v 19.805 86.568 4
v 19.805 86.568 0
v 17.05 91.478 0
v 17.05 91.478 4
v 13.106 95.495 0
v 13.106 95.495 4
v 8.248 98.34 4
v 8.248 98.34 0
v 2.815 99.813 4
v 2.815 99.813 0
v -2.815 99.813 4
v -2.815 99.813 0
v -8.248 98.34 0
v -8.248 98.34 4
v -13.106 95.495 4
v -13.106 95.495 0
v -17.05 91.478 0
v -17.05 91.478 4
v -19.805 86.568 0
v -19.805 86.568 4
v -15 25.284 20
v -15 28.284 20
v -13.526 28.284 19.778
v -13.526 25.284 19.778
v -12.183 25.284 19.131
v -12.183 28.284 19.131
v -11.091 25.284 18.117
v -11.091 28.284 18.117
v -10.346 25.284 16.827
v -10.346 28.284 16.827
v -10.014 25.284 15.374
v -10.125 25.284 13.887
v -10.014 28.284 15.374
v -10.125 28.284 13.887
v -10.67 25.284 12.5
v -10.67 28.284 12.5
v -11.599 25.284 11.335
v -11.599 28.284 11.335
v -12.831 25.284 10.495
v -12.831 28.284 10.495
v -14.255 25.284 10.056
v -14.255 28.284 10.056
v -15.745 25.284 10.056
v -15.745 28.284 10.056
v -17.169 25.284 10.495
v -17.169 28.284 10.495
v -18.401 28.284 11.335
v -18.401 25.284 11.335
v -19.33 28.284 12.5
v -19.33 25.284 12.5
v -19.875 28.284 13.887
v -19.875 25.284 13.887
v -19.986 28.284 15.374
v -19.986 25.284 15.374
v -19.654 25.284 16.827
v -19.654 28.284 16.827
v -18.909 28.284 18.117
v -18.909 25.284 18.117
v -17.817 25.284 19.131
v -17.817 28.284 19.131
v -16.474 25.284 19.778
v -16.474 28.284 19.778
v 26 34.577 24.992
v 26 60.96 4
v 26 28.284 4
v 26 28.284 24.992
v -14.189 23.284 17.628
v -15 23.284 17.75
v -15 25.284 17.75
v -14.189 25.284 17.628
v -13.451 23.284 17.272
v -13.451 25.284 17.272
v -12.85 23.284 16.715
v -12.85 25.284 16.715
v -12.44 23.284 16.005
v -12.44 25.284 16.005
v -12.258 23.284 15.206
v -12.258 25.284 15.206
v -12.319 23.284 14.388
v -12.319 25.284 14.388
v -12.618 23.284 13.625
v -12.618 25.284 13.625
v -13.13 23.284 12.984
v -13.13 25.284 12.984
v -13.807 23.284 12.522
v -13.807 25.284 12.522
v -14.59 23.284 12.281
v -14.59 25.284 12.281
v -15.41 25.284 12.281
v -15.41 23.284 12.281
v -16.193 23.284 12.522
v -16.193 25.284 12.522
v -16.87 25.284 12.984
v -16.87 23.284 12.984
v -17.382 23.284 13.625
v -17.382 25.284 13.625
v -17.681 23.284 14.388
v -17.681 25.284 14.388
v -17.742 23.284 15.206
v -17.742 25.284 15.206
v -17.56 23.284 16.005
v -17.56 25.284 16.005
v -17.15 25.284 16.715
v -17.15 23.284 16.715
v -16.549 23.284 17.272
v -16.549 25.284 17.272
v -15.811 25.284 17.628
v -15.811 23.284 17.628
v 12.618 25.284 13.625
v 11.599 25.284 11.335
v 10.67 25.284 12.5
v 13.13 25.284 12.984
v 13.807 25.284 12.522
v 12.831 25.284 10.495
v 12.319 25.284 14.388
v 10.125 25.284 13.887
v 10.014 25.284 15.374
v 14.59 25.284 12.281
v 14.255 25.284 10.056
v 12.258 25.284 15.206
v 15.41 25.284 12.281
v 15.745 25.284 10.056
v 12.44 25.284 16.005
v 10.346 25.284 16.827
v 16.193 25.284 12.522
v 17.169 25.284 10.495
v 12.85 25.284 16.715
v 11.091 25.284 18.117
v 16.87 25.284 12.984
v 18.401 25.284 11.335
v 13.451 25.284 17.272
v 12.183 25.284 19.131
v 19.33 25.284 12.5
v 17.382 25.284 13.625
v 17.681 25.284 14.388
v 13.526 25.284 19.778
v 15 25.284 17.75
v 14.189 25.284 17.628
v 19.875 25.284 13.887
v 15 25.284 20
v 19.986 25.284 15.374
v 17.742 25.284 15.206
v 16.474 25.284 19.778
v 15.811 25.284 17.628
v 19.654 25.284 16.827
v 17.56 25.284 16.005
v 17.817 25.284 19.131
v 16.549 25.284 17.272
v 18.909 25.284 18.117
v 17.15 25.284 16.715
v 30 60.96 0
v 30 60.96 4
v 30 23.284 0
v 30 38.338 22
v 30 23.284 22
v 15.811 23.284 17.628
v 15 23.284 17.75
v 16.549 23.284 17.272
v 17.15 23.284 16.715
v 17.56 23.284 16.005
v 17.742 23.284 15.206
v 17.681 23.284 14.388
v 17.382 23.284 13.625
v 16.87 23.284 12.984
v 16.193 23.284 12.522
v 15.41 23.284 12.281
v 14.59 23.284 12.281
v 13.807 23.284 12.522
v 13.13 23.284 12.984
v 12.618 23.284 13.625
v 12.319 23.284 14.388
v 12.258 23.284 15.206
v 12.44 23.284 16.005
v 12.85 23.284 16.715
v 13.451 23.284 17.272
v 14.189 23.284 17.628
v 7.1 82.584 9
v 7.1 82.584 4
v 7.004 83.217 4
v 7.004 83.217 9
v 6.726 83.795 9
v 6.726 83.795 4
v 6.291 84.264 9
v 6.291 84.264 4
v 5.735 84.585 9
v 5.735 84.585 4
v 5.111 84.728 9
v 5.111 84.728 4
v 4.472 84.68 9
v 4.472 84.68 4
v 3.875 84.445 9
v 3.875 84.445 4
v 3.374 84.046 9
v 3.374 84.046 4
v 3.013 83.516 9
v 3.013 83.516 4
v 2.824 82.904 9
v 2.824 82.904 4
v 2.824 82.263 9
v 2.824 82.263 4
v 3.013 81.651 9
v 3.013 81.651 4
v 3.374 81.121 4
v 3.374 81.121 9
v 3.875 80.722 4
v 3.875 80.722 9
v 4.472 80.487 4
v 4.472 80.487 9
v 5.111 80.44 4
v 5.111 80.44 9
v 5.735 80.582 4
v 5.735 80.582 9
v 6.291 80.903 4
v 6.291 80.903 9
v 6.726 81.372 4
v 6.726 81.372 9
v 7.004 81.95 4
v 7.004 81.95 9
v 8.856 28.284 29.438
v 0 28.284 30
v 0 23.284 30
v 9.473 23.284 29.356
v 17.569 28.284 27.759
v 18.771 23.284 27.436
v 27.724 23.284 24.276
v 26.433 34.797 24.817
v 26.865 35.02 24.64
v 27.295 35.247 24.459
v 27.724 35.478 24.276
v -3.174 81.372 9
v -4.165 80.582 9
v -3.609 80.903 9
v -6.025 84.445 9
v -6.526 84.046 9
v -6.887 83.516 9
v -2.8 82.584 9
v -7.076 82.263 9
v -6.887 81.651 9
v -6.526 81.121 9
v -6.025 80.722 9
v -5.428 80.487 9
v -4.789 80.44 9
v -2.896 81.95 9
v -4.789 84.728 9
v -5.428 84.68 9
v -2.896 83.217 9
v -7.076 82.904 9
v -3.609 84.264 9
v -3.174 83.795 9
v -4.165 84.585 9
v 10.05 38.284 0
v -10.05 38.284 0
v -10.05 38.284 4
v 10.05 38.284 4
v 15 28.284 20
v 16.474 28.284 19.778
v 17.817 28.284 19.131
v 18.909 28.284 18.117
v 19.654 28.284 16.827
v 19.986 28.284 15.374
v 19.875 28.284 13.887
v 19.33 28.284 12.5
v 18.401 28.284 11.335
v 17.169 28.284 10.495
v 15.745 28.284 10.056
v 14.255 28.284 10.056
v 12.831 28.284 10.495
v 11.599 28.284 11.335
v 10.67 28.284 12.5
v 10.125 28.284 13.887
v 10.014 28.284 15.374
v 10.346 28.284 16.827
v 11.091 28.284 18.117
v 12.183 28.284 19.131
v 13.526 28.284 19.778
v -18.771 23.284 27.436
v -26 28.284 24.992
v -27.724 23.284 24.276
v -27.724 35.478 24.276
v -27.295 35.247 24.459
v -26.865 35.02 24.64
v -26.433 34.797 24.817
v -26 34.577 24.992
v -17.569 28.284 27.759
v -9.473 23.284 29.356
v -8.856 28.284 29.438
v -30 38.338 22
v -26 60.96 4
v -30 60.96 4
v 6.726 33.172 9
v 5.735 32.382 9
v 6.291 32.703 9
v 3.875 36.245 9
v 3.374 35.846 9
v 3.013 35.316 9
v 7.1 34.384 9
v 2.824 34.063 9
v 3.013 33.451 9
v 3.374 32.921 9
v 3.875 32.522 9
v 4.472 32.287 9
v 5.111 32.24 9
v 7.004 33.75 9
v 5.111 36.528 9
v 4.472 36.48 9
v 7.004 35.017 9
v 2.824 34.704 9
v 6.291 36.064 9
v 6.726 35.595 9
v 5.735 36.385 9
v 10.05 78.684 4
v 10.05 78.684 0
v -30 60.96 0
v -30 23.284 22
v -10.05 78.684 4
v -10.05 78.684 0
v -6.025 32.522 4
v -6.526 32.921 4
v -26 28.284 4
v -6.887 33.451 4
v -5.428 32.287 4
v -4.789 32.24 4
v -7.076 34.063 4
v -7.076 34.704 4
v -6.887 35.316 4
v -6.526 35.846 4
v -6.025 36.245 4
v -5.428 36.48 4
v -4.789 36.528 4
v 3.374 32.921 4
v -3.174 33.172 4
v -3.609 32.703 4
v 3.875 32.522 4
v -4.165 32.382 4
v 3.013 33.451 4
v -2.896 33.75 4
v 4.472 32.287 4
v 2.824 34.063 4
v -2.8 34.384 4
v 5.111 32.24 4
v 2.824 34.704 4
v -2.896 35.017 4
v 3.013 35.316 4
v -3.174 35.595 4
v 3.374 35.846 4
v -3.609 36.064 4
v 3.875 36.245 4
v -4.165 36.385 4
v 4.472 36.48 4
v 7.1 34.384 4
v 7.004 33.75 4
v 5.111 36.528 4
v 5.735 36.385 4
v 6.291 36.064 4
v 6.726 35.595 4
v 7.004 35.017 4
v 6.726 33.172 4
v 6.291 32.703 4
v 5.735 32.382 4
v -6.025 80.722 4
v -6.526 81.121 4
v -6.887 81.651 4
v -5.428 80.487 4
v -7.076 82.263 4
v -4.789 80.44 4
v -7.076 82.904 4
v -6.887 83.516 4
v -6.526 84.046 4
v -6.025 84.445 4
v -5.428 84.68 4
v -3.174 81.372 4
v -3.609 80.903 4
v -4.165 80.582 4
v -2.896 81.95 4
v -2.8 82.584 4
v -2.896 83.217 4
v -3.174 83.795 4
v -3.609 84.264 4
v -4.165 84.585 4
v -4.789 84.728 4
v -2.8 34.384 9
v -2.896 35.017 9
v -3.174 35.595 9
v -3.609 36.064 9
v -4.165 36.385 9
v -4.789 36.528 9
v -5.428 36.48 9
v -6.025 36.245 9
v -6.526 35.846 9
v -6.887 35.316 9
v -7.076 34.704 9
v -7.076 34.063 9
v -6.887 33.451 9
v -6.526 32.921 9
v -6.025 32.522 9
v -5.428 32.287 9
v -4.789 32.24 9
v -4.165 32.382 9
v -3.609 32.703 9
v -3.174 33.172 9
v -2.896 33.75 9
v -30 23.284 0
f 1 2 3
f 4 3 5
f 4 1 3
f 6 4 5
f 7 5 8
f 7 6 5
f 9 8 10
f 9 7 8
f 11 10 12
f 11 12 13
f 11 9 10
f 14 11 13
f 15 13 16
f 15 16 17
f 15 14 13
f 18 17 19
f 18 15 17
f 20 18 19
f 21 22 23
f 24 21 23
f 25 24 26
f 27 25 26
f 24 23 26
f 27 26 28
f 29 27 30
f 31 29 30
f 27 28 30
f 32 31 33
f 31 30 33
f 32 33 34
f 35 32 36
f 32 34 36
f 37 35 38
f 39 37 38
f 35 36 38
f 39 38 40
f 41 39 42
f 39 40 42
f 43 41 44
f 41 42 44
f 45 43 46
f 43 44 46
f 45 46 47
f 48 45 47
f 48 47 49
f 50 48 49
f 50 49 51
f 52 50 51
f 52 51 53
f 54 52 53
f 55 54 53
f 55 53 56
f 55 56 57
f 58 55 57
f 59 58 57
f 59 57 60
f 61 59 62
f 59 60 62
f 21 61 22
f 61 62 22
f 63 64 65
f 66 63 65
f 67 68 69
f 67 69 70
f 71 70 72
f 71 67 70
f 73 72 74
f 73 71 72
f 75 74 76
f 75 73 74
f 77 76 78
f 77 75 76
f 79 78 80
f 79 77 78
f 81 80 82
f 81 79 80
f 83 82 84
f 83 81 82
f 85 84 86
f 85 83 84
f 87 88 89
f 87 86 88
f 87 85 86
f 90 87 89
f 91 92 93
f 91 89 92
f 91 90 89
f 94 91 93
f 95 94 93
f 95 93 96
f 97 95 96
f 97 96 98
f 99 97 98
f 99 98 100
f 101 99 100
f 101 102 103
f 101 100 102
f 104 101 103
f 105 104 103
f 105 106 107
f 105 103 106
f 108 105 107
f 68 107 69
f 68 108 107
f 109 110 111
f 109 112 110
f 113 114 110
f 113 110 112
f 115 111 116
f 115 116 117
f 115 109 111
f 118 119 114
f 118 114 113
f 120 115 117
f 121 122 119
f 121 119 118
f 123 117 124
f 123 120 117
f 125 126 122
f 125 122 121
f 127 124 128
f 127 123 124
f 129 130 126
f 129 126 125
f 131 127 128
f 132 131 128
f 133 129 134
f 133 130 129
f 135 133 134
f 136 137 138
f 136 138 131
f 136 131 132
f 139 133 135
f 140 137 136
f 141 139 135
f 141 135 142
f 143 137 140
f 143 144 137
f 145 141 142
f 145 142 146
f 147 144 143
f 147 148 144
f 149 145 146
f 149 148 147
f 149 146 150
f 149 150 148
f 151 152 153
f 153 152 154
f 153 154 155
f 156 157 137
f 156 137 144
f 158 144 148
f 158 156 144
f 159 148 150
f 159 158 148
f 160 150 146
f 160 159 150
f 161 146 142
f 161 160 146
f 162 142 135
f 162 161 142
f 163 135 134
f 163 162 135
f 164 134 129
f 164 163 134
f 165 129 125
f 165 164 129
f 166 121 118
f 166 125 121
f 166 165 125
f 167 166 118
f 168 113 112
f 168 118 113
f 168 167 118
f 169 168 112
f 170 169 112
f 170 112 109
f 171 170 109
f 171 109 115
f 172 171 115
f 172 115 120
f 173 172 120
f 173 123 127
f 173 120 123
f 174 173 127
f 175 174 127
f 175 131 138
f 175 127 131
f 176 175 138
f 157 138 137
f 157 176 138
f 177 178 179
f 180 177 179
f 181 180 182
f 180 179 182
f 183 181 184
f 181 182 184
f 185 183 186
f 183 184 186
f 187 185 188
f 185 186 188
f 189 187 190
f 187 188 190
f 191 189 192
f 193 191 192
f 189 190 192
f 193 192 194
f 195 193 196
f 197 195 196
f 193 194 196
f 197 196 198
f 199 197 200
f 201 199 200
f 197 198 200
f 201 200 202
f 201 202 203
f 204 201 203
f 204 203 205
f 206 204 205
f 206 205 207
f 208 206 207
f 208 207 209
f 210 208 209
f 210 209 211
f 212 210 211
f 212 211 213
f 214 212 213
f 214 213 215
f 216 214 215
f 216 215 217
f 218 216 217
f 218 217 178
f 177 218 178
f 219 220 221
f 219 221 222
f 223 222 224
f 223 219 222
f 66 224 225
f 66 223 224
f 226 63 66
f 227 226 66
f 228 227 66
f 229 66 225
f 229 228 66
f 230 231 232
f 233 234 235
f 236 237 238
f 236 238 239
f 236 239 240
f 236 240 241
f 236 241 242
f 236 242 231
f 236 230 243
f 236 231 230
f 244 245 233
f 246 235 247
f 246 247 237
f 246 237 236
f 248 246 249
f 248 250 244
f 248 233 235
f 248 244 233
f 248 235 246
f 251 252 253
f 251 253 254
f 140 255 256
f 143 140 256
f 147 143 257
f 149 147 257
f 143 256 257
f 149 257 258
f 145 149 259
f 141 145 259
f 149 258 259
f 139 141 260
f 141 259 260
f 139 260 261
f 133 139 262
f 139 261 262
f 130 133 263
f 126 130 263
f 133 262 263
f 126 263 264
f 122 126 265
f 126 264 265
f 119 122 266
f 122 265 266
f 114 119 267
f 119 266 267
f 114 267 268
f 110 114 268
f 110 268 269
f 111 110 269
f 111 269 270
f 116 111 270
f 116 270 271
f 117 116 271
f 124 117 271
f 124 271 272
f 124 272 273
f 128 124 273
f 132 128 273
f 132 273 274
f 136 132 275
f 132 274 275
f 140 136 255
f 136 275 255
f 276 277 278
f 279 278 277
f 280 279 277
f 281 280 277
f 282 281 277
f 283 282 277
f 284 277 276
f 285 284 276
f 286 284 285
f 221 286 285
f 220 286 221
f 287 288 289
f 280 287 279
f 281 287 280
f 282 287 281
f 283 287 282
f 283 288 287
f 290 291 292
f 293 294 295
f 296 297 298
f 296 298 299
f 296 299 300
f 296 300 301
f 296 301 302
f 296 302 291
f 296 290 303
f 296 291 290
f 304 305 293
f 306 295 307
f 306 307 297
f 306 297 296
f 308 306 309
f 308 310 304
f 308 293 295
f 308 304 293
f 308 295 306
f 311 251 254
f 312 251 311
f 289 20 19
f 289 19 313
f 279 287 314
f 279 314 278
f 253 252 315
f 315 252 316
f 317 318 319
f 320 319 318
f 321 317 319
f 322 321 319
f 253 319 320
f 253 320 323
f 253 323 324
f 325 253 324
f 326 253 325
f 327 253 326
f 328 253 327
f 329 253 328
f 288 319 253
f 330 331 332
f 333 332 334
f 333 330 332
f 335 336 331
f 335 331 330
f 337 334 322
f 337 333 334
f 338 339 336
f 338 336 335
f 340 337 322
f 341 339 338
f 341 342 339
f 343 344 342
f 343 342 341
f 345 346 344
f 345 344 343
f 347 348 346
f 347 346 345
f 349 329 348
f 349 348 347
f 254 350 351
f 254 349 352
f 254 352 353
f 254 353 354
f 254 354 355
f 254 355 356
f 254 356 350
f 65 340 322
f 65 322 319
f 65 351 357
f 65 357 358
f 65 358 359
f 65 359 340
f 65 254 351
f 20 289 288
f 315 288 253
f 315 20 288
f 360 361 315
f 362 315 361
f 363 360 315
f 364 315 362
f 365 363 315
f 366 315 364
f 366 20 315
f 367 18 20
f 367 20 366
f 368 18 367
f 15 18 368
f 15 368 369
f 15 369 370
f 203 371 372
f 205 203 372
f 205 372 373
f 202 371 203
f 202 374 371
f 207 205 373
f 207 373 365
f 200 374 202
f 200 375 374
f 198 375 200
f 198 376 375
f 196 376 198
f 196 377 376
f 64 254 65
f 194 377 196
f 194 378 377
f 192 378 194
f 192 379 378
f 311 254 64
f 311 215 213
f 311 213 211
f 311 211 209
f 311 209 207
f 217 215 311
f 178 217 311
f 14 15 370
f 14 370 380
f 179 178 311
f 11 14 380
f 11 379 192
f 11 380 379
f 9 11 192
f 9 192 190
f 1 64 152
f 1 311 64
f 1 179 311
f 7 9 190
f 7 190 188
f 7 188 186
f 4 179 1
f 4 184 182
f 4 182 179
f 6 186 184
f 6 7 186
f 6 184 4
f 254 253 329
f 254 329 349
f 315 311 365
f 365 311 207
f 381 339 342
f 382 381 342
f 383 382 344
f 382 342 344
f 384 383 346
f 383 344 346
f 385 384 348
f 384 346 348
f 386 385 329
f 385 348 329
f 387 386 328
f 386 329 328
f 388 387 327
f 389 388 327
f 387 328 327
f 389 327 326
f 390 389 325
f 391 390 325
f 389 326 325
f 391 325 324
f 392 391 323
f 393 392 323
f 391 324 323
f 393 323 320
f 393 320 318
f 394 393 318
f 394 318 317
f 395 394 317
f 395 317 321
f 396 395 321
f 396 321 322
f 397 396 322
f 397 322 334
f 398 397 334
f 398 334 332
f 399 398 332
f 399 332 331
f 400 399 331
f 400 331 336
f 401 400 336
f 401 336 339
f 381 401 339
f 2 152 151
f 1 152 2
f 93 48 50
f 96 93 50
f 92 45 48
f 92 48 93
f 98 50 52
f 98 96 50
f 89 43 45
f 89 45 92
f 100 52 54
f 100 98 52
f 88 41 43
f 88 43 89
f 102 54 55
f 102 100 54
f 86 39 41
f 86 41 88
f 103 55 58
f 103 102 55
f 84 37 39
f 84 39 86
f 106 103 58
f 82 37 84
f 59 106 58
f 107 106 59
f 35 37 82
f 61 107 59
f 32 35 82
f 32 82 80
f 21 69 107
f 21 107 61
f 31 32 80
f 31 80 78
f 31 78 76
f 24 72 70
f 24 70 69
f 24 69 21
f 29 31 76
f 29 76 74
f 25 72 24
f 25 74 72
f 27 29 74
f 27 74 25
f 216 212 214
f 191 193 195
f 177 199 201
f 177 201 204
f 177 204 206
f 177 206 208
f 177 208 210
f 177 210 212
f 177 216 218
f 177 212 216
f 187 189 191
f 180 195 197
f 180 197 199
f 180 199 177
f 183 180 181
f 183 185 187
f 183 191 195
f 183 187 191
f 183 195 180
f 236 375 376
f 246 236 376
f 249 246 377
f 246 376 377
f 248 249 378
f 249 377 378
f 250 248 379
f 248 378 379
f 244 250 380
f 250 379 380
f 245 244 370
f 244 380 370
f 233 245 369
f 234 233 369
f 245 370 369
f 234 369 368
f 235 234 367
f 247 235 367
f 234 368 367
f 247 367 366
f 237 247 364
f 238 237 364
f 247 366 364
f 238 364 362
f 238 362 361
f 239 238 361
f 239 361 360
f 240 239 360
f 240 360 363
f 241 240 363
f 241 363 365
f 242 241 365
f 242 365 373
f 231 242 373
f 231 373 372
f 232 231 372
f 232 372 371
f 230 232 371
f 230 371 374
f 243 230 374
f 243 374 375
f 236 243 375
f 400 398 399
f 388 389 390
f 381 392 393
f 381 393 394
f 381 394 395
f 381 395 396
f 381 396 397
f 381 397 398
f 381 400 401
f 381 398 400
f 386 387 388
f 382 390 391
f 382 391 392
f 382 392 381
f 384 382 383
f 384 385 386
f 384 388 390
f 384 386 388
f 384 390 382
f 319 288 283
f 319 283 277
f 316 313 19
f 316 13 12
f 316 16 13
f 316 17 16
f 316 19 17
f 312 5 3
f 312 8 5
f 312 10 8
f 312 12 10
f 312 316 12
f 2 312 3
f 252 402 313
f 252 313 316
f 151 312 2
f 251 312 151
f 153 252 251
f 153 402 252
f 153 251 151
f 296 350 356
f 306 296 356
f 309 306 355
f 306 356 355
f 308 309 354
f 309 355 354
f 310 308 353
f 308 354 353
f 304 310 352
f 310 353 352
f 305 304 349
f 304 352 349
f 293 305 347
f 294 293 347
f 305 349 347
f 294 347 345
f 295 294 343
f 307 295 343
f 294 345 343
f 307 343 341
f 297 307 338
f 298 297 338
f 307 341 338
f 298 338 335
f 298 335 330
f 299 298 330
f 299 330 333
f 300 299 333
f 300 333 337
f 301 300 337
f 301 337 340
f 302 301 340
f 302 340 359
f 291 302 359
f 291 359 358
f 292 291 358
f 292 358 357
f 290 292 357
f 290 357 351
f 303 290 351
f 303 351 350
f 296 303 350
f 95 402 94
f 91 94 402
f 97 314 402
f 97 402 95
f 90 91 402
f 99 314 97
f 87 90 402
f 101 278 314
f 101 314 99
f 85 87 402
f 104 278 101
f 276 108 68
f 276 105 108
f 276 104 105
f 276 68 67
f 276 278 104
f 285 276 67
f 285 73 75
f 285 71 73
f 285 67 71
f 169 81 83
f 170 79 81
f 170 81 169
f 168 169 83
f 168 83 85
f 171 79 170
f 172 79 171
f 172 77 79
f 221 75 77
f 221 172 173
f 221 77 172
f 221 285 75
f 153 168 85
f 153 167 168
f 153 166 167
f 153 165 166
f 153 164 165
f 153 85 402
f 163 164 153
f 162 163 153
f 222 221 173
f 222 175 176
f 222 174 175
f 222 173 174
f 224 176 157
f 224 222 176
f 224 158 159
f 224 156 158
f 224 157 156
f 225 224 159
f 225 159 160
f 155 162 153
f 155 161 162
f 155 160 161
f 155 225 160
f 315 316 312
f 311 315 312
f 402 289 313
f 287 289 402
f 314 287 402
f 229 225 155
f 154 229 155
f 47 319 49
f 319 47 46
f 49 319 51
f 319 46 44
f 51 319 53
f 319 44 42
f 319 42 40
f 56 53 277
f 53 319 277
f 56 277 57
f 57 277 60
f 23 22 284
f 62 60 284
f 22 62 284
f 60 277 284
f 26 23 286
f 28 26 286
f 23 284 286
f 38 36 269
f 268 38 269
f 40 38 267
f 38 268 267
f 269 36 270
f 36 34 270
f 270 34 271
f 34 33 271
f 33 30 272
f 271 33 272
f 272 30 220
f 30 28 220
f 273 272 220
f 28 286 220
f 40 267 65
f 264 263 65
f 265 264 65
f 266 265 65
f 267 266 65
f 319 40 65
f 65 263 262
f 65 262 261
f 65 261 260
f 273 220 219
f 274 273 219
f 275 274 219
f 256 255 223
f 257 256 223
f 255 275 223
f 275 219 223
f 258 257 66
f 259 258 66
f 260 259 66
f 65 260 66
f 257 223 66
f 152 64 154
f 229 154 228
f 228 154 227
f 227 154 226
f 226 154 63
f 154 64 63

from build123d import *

# Parameters (mm, degrees)
SKETCH1_W                = 120
SKETCH1_H                = 30
BOSS_EXTRUDE1_DEPTH      = 100
CUT_EXTRUDE1_DEPTH       = 121.415945788
CUT_EXTRUDE1_DEPTH_BACK  = 121.415945788
SKETCH2_R                = 2.15
SKETCH2_W                = 20.1
SKETCH2_H                = 40.4
SKETCH3_OUTSIDE_W        = 153.812
SKETCH3_OUTSIDE_H        = 133.812
CUT_EXTRUDE2_DEPTH       = 121.415945788
CUT_EXTRUDE3_START       = -30
CUT_EXTRUDE3_DEPTH       = 30
SKETCH5_W                = 67.698745078
SKETCH5_H                = 100.8
CUT_EXTRUDE4_DEPTH       = 26
RIB1_REACH               = 122.416
SKETCH6_WALL_W           = 284.590065176
SKETCH6_WALL_H           = 4
RIB6_REACH               = 122.416
SKETCH7_WALL_W           = 284.590065176
SKETCH7_WALL_H           = 4
BOSS_EXTRUDE2_DEPTH      = 5
BOSS_EXTRUDE2_DEPTH_BACK = 4
SKETCH8_R                = 2.15
CUT_EXTRUDE5_DEPTH       = 84.326168543
CUT_EXTRUDE5_DEPTH_BACK  = 84.326168543
SKETCH9_R                = 2.75
SKETCH10_R               = 5
CUT_EXTRUDE6_DEPTH       = 3
CHAMFER1_SIZE            = 8
CUT_EXTRUDE7_START       = -12.194246874
CUT_EXTRUDE7_DEPTH       = 12.194246874


# Read off the part's stored shape, not the designer's step: Cut-Extrude3, Cut-Extrude7
with BuildPart() as part:
    # Sketch1 → Boss-Extrude1 (new body)
    with BuildSketch(Plane(origin=(0, 0, 0), x_dir=(1, 0, 0), z_dir=(0, 1, 0))):
        with Locations((0, -15)):
            Rectangle(SKETCH1_W, SKETCH1_H)
    extrude(amount=BOSS_EXTRUDE1_DEPTH)

    # Sketch2 → Cut-Extrude1 (cut, two sides: drawn at the far end of the back side and taken through both)
    with BuildSketch(Plane.XY.offset(30).offset(-CUT_EXTRUDE1_DEPTH_BACK)):
        with Locations((-4.95, 82.583541889)):
            Circle(SKETCH2_R)
        with Locations((4.95, 82.583541889)):
            Circle(SKETCH2_R)
        with Locations((-4.95, 34.383541889)):
            Circle(SKETCH2_R)
        with Locations((4.95, 34.383541889)):
            Circle(SKETCH2_R)
        with Locations((0, 58.483541889)):
            Rectangle(SKETCH2_W, SKETCH2_H)
    extrude(amount=CUT_EXTRUDE1_DEPTH + CUT_EXTRUDE1_DEPTH_BACK, mode=Mode.SUBTRACT)

    # Sketch3 outside → Cut-Extrude2 (cut, through all)
    with BuildSketch(Plane.XY.offset(30)):
        with Locations((0, 50)):
            Rectangle(SKETCH3_OUTSIDE_W, SKETCH3_OUTSIDE_H)
        with BuildLine():
            Line((-45, 23.283541889), (45, 23.283541889))
            Line((45, 23.283541889), (19.804596008, 86.568297014))
            ThreePointArc((19.804596008, 86.568297014), (0, 100), (-19.804596008, 86.568297014))
            Line((-19.804596008, 86.568297014), (-45, 23.283541889))
        make_face(mode=Mode.SUBTRACT)
    extrude(amount=-CUT_EXTRUDE2_DEPTH, mode=Mode.SUBTRACT)

    # Cut-Extrude3 outline → Cut-Extrude3 (cut)
    with BuildSketch(Plane.XY.offset(30).offset(CUT_EXTRUDE3_START)):
        Polygon((30, 60.95991045), (30, 23.283541889), (45, 23.283541889), align=None)
        Polygon((-30, 23.283541889), (-30, 60.95991045), (-45, 23.283541889), align=None)
    extrude(amount=CUT_EXTRUDE3_DEPTH, mode=Mode.SUBTRACT)

    # Sketch5 → Cut-Extrude4 (cut)
    with BuildSketch(Plane.XY.offset(30)):
        with Locations((0, 78.683541889)):
            Rectangle(SKETCH5_W, SKETCH5_H)
    extrude(amount=-CUT_EXTRUDE4_DEPTH, mode=Mode.SUBTRACT)

    # Sketch6 wall → Rib1 (add, up to next)
    with BuildSketch(Plane(origin=(-30, 44.62172617, 17), x_dir=(0, -0.782514313837, 0.622632595228), z_dir=(0, 0.622632595228, 0.782514313837)), mode=Mode.PRIVATE) as rib1_sk1:
        with Locations((0, 2)):
            Rectangle(SKETCH6_WALL_W, SKETCH6_WALL_H)
    rib1_tool1 = extrude(rib1_sk1.sketch, amount=-RIB1_REACH, mode=Mode.PRIVATE) - part.part
    add(rib1_tool1.solids().sort_by_distance((-30, 44.62172617, 17))[0])

    # Sketch7 wall → Rib6 (add, up to next)
    with BuildSketch(Plane(origin=(30, 44.62172617, 17), x_dir=(0, -0.782514313837, 0.622632595228), z_dir=(0, -0.622632595228, -0.782514313837)), mode=Mode.PRIVATE) as rib6_sk1:
        with Locations((0, 2)):
            Rectangle(SKETCH7_WALL_W, SKETCH7_WALL_H)
    rib6_tool1 = extrude(rib6_sk1.sketch, amount=RIB6_REACH, mode=Mode.PRIVATE) - part.part
    add(rib6_tool1.solids().sort_by_distance((30, 44.62172617, 17))[0])

    # Sketch8 → Boss-Extrude2 (add, two sides: drawn at the far end of the back side and taken through both)
    with BuildSketch(Plane.XY.offset(4).offset(-BOSS_EXTRUDE2_DEPTH_BACK)):
        with Locations((-4.95, 82.583541889)):
            Circle(SKETCH8_R)
        with Locations((4.95, 82.583541889)):
            Circle(SKETCH8_R)
        with Locations((-4.95, 34.383541889)):
            Circle(SKETCH8_R)
        with Locations((4.95, 34.383541889)):
            Circle(SKETCH8_R)
    extrude(amount=BOSS_EXTRUDE2_DEPTH + BOSS_EXTRUDE2_DEPTH_BACK)

    # Sketch9 → Cut-Extrude5 (cut, two sides: drawn at the far end of the back side and taken through both)
    with BuildSketch(Plane(origin=(0, 28.283541889, 0), x_dir=(1, 0, 0), z_dir=(0, 1, 0)).offset(-CUT_EXTRUDE5_DEPTH_BACK)):
        with Locations(Location((-15, -15, 0), (0, 0, 270))):
            Circle(SKETCH9_R)
        with Locations(Location((15, -15, 0), (0, 0, 270))):
            Circle(SKETCH9_R)
    extrude(amount=CUT_EXTRUDE5_DEPTH + CUT_EXTRUDE5_DEPTH_BACK, mode=Mode.SUBTRACT)

    # Sketch10 → Cut-Extrude6 (cut)
    with BuildSketch(Plane(origin=(0, 28.283541889, 0), x_dir=(1, 0, 0), z_dir=(0, 1, 0))):
        with Locations(Location((-15, -15, 0), (0, 0, 270))):
            Circle(SKETCH10_R)
        with Locations(Location((15, -15, 0), (0, 0, 270))):
            Circle(SKETCH10_R)
    extrude(amount=-CUT_EXTRUDE6_DEPTH, mode=Mode.SUBTRACT)

    # Chamfer1
    # the kernel refuses this chamfer: 8 mm, written as the material it takes off along each edge
    with BuildSketch(Plane(origin=(-30, 2.710077985, 30), x_dir=(-0.02749587661058658, 0, -0.9996219169112968), z_dir=(0, 1, 0))) as chamfer1_piece_1:
        Polygon((CHAMFER1_SIZE * 0.999621916911, -CHAMFER1_SIZE * 0.0274958766106), (-CHAMFER1_SIZE * 0.0274958766106, -CHAMFER1_SIZE * 0.999621916911), (0, 0), align=None)
    extrude(amount=46.146927807, mode=Mode.SUBTRACT)
    with BuildSketch(Plane(origin=(30, 48.857005793, 30), x_dir=(-0.9996219169112968, 0, 0.027495876610586487), z_dir=(0, -1, 0))) as chamfer1_piece_2:
        Polygon((CHAMFER1_SIZE * 0.999621916911, CHAMFER1_SIZE * 0.0274958766106), (-CHAMFER1_SIZE * 0.0274958766106, CHAMFER1_SIZE * 0.999621916911), (0, 0), align=None)
    extrude(amount=46.146927807, mode=Mode.SUBTRACT)

    # Cut-Extrude7 outline → Cut-Extrude7 (cut)
    with BuildSketch(Plane.XZ.offset(-23.283541889).offset(CUT_EXTRUDE7_START)):
        with BuildLine():
            ThreePointArc((-27.724333118, 24.275666882), (-14.154563191, 28.553981218), (0, 30))
            Line((0, 30), (-22, 30))
            Line((-22, 30), (-27.724333118, 24.275666882))
        make_face()
        with BuildLine():
            ThreePointArc((0, 30), (14.154563191, 28.553981218), (27.724333118, 24.275666882))
            Line((27.724333118, 24.275666882), (22, 30))
            Line((22, 30), (0, 30))
        make_face()
    extrude(amount=CUT_EXTRUDE7_DEPTH, mode=Mode.SUBTRACT)


solid = part.part
